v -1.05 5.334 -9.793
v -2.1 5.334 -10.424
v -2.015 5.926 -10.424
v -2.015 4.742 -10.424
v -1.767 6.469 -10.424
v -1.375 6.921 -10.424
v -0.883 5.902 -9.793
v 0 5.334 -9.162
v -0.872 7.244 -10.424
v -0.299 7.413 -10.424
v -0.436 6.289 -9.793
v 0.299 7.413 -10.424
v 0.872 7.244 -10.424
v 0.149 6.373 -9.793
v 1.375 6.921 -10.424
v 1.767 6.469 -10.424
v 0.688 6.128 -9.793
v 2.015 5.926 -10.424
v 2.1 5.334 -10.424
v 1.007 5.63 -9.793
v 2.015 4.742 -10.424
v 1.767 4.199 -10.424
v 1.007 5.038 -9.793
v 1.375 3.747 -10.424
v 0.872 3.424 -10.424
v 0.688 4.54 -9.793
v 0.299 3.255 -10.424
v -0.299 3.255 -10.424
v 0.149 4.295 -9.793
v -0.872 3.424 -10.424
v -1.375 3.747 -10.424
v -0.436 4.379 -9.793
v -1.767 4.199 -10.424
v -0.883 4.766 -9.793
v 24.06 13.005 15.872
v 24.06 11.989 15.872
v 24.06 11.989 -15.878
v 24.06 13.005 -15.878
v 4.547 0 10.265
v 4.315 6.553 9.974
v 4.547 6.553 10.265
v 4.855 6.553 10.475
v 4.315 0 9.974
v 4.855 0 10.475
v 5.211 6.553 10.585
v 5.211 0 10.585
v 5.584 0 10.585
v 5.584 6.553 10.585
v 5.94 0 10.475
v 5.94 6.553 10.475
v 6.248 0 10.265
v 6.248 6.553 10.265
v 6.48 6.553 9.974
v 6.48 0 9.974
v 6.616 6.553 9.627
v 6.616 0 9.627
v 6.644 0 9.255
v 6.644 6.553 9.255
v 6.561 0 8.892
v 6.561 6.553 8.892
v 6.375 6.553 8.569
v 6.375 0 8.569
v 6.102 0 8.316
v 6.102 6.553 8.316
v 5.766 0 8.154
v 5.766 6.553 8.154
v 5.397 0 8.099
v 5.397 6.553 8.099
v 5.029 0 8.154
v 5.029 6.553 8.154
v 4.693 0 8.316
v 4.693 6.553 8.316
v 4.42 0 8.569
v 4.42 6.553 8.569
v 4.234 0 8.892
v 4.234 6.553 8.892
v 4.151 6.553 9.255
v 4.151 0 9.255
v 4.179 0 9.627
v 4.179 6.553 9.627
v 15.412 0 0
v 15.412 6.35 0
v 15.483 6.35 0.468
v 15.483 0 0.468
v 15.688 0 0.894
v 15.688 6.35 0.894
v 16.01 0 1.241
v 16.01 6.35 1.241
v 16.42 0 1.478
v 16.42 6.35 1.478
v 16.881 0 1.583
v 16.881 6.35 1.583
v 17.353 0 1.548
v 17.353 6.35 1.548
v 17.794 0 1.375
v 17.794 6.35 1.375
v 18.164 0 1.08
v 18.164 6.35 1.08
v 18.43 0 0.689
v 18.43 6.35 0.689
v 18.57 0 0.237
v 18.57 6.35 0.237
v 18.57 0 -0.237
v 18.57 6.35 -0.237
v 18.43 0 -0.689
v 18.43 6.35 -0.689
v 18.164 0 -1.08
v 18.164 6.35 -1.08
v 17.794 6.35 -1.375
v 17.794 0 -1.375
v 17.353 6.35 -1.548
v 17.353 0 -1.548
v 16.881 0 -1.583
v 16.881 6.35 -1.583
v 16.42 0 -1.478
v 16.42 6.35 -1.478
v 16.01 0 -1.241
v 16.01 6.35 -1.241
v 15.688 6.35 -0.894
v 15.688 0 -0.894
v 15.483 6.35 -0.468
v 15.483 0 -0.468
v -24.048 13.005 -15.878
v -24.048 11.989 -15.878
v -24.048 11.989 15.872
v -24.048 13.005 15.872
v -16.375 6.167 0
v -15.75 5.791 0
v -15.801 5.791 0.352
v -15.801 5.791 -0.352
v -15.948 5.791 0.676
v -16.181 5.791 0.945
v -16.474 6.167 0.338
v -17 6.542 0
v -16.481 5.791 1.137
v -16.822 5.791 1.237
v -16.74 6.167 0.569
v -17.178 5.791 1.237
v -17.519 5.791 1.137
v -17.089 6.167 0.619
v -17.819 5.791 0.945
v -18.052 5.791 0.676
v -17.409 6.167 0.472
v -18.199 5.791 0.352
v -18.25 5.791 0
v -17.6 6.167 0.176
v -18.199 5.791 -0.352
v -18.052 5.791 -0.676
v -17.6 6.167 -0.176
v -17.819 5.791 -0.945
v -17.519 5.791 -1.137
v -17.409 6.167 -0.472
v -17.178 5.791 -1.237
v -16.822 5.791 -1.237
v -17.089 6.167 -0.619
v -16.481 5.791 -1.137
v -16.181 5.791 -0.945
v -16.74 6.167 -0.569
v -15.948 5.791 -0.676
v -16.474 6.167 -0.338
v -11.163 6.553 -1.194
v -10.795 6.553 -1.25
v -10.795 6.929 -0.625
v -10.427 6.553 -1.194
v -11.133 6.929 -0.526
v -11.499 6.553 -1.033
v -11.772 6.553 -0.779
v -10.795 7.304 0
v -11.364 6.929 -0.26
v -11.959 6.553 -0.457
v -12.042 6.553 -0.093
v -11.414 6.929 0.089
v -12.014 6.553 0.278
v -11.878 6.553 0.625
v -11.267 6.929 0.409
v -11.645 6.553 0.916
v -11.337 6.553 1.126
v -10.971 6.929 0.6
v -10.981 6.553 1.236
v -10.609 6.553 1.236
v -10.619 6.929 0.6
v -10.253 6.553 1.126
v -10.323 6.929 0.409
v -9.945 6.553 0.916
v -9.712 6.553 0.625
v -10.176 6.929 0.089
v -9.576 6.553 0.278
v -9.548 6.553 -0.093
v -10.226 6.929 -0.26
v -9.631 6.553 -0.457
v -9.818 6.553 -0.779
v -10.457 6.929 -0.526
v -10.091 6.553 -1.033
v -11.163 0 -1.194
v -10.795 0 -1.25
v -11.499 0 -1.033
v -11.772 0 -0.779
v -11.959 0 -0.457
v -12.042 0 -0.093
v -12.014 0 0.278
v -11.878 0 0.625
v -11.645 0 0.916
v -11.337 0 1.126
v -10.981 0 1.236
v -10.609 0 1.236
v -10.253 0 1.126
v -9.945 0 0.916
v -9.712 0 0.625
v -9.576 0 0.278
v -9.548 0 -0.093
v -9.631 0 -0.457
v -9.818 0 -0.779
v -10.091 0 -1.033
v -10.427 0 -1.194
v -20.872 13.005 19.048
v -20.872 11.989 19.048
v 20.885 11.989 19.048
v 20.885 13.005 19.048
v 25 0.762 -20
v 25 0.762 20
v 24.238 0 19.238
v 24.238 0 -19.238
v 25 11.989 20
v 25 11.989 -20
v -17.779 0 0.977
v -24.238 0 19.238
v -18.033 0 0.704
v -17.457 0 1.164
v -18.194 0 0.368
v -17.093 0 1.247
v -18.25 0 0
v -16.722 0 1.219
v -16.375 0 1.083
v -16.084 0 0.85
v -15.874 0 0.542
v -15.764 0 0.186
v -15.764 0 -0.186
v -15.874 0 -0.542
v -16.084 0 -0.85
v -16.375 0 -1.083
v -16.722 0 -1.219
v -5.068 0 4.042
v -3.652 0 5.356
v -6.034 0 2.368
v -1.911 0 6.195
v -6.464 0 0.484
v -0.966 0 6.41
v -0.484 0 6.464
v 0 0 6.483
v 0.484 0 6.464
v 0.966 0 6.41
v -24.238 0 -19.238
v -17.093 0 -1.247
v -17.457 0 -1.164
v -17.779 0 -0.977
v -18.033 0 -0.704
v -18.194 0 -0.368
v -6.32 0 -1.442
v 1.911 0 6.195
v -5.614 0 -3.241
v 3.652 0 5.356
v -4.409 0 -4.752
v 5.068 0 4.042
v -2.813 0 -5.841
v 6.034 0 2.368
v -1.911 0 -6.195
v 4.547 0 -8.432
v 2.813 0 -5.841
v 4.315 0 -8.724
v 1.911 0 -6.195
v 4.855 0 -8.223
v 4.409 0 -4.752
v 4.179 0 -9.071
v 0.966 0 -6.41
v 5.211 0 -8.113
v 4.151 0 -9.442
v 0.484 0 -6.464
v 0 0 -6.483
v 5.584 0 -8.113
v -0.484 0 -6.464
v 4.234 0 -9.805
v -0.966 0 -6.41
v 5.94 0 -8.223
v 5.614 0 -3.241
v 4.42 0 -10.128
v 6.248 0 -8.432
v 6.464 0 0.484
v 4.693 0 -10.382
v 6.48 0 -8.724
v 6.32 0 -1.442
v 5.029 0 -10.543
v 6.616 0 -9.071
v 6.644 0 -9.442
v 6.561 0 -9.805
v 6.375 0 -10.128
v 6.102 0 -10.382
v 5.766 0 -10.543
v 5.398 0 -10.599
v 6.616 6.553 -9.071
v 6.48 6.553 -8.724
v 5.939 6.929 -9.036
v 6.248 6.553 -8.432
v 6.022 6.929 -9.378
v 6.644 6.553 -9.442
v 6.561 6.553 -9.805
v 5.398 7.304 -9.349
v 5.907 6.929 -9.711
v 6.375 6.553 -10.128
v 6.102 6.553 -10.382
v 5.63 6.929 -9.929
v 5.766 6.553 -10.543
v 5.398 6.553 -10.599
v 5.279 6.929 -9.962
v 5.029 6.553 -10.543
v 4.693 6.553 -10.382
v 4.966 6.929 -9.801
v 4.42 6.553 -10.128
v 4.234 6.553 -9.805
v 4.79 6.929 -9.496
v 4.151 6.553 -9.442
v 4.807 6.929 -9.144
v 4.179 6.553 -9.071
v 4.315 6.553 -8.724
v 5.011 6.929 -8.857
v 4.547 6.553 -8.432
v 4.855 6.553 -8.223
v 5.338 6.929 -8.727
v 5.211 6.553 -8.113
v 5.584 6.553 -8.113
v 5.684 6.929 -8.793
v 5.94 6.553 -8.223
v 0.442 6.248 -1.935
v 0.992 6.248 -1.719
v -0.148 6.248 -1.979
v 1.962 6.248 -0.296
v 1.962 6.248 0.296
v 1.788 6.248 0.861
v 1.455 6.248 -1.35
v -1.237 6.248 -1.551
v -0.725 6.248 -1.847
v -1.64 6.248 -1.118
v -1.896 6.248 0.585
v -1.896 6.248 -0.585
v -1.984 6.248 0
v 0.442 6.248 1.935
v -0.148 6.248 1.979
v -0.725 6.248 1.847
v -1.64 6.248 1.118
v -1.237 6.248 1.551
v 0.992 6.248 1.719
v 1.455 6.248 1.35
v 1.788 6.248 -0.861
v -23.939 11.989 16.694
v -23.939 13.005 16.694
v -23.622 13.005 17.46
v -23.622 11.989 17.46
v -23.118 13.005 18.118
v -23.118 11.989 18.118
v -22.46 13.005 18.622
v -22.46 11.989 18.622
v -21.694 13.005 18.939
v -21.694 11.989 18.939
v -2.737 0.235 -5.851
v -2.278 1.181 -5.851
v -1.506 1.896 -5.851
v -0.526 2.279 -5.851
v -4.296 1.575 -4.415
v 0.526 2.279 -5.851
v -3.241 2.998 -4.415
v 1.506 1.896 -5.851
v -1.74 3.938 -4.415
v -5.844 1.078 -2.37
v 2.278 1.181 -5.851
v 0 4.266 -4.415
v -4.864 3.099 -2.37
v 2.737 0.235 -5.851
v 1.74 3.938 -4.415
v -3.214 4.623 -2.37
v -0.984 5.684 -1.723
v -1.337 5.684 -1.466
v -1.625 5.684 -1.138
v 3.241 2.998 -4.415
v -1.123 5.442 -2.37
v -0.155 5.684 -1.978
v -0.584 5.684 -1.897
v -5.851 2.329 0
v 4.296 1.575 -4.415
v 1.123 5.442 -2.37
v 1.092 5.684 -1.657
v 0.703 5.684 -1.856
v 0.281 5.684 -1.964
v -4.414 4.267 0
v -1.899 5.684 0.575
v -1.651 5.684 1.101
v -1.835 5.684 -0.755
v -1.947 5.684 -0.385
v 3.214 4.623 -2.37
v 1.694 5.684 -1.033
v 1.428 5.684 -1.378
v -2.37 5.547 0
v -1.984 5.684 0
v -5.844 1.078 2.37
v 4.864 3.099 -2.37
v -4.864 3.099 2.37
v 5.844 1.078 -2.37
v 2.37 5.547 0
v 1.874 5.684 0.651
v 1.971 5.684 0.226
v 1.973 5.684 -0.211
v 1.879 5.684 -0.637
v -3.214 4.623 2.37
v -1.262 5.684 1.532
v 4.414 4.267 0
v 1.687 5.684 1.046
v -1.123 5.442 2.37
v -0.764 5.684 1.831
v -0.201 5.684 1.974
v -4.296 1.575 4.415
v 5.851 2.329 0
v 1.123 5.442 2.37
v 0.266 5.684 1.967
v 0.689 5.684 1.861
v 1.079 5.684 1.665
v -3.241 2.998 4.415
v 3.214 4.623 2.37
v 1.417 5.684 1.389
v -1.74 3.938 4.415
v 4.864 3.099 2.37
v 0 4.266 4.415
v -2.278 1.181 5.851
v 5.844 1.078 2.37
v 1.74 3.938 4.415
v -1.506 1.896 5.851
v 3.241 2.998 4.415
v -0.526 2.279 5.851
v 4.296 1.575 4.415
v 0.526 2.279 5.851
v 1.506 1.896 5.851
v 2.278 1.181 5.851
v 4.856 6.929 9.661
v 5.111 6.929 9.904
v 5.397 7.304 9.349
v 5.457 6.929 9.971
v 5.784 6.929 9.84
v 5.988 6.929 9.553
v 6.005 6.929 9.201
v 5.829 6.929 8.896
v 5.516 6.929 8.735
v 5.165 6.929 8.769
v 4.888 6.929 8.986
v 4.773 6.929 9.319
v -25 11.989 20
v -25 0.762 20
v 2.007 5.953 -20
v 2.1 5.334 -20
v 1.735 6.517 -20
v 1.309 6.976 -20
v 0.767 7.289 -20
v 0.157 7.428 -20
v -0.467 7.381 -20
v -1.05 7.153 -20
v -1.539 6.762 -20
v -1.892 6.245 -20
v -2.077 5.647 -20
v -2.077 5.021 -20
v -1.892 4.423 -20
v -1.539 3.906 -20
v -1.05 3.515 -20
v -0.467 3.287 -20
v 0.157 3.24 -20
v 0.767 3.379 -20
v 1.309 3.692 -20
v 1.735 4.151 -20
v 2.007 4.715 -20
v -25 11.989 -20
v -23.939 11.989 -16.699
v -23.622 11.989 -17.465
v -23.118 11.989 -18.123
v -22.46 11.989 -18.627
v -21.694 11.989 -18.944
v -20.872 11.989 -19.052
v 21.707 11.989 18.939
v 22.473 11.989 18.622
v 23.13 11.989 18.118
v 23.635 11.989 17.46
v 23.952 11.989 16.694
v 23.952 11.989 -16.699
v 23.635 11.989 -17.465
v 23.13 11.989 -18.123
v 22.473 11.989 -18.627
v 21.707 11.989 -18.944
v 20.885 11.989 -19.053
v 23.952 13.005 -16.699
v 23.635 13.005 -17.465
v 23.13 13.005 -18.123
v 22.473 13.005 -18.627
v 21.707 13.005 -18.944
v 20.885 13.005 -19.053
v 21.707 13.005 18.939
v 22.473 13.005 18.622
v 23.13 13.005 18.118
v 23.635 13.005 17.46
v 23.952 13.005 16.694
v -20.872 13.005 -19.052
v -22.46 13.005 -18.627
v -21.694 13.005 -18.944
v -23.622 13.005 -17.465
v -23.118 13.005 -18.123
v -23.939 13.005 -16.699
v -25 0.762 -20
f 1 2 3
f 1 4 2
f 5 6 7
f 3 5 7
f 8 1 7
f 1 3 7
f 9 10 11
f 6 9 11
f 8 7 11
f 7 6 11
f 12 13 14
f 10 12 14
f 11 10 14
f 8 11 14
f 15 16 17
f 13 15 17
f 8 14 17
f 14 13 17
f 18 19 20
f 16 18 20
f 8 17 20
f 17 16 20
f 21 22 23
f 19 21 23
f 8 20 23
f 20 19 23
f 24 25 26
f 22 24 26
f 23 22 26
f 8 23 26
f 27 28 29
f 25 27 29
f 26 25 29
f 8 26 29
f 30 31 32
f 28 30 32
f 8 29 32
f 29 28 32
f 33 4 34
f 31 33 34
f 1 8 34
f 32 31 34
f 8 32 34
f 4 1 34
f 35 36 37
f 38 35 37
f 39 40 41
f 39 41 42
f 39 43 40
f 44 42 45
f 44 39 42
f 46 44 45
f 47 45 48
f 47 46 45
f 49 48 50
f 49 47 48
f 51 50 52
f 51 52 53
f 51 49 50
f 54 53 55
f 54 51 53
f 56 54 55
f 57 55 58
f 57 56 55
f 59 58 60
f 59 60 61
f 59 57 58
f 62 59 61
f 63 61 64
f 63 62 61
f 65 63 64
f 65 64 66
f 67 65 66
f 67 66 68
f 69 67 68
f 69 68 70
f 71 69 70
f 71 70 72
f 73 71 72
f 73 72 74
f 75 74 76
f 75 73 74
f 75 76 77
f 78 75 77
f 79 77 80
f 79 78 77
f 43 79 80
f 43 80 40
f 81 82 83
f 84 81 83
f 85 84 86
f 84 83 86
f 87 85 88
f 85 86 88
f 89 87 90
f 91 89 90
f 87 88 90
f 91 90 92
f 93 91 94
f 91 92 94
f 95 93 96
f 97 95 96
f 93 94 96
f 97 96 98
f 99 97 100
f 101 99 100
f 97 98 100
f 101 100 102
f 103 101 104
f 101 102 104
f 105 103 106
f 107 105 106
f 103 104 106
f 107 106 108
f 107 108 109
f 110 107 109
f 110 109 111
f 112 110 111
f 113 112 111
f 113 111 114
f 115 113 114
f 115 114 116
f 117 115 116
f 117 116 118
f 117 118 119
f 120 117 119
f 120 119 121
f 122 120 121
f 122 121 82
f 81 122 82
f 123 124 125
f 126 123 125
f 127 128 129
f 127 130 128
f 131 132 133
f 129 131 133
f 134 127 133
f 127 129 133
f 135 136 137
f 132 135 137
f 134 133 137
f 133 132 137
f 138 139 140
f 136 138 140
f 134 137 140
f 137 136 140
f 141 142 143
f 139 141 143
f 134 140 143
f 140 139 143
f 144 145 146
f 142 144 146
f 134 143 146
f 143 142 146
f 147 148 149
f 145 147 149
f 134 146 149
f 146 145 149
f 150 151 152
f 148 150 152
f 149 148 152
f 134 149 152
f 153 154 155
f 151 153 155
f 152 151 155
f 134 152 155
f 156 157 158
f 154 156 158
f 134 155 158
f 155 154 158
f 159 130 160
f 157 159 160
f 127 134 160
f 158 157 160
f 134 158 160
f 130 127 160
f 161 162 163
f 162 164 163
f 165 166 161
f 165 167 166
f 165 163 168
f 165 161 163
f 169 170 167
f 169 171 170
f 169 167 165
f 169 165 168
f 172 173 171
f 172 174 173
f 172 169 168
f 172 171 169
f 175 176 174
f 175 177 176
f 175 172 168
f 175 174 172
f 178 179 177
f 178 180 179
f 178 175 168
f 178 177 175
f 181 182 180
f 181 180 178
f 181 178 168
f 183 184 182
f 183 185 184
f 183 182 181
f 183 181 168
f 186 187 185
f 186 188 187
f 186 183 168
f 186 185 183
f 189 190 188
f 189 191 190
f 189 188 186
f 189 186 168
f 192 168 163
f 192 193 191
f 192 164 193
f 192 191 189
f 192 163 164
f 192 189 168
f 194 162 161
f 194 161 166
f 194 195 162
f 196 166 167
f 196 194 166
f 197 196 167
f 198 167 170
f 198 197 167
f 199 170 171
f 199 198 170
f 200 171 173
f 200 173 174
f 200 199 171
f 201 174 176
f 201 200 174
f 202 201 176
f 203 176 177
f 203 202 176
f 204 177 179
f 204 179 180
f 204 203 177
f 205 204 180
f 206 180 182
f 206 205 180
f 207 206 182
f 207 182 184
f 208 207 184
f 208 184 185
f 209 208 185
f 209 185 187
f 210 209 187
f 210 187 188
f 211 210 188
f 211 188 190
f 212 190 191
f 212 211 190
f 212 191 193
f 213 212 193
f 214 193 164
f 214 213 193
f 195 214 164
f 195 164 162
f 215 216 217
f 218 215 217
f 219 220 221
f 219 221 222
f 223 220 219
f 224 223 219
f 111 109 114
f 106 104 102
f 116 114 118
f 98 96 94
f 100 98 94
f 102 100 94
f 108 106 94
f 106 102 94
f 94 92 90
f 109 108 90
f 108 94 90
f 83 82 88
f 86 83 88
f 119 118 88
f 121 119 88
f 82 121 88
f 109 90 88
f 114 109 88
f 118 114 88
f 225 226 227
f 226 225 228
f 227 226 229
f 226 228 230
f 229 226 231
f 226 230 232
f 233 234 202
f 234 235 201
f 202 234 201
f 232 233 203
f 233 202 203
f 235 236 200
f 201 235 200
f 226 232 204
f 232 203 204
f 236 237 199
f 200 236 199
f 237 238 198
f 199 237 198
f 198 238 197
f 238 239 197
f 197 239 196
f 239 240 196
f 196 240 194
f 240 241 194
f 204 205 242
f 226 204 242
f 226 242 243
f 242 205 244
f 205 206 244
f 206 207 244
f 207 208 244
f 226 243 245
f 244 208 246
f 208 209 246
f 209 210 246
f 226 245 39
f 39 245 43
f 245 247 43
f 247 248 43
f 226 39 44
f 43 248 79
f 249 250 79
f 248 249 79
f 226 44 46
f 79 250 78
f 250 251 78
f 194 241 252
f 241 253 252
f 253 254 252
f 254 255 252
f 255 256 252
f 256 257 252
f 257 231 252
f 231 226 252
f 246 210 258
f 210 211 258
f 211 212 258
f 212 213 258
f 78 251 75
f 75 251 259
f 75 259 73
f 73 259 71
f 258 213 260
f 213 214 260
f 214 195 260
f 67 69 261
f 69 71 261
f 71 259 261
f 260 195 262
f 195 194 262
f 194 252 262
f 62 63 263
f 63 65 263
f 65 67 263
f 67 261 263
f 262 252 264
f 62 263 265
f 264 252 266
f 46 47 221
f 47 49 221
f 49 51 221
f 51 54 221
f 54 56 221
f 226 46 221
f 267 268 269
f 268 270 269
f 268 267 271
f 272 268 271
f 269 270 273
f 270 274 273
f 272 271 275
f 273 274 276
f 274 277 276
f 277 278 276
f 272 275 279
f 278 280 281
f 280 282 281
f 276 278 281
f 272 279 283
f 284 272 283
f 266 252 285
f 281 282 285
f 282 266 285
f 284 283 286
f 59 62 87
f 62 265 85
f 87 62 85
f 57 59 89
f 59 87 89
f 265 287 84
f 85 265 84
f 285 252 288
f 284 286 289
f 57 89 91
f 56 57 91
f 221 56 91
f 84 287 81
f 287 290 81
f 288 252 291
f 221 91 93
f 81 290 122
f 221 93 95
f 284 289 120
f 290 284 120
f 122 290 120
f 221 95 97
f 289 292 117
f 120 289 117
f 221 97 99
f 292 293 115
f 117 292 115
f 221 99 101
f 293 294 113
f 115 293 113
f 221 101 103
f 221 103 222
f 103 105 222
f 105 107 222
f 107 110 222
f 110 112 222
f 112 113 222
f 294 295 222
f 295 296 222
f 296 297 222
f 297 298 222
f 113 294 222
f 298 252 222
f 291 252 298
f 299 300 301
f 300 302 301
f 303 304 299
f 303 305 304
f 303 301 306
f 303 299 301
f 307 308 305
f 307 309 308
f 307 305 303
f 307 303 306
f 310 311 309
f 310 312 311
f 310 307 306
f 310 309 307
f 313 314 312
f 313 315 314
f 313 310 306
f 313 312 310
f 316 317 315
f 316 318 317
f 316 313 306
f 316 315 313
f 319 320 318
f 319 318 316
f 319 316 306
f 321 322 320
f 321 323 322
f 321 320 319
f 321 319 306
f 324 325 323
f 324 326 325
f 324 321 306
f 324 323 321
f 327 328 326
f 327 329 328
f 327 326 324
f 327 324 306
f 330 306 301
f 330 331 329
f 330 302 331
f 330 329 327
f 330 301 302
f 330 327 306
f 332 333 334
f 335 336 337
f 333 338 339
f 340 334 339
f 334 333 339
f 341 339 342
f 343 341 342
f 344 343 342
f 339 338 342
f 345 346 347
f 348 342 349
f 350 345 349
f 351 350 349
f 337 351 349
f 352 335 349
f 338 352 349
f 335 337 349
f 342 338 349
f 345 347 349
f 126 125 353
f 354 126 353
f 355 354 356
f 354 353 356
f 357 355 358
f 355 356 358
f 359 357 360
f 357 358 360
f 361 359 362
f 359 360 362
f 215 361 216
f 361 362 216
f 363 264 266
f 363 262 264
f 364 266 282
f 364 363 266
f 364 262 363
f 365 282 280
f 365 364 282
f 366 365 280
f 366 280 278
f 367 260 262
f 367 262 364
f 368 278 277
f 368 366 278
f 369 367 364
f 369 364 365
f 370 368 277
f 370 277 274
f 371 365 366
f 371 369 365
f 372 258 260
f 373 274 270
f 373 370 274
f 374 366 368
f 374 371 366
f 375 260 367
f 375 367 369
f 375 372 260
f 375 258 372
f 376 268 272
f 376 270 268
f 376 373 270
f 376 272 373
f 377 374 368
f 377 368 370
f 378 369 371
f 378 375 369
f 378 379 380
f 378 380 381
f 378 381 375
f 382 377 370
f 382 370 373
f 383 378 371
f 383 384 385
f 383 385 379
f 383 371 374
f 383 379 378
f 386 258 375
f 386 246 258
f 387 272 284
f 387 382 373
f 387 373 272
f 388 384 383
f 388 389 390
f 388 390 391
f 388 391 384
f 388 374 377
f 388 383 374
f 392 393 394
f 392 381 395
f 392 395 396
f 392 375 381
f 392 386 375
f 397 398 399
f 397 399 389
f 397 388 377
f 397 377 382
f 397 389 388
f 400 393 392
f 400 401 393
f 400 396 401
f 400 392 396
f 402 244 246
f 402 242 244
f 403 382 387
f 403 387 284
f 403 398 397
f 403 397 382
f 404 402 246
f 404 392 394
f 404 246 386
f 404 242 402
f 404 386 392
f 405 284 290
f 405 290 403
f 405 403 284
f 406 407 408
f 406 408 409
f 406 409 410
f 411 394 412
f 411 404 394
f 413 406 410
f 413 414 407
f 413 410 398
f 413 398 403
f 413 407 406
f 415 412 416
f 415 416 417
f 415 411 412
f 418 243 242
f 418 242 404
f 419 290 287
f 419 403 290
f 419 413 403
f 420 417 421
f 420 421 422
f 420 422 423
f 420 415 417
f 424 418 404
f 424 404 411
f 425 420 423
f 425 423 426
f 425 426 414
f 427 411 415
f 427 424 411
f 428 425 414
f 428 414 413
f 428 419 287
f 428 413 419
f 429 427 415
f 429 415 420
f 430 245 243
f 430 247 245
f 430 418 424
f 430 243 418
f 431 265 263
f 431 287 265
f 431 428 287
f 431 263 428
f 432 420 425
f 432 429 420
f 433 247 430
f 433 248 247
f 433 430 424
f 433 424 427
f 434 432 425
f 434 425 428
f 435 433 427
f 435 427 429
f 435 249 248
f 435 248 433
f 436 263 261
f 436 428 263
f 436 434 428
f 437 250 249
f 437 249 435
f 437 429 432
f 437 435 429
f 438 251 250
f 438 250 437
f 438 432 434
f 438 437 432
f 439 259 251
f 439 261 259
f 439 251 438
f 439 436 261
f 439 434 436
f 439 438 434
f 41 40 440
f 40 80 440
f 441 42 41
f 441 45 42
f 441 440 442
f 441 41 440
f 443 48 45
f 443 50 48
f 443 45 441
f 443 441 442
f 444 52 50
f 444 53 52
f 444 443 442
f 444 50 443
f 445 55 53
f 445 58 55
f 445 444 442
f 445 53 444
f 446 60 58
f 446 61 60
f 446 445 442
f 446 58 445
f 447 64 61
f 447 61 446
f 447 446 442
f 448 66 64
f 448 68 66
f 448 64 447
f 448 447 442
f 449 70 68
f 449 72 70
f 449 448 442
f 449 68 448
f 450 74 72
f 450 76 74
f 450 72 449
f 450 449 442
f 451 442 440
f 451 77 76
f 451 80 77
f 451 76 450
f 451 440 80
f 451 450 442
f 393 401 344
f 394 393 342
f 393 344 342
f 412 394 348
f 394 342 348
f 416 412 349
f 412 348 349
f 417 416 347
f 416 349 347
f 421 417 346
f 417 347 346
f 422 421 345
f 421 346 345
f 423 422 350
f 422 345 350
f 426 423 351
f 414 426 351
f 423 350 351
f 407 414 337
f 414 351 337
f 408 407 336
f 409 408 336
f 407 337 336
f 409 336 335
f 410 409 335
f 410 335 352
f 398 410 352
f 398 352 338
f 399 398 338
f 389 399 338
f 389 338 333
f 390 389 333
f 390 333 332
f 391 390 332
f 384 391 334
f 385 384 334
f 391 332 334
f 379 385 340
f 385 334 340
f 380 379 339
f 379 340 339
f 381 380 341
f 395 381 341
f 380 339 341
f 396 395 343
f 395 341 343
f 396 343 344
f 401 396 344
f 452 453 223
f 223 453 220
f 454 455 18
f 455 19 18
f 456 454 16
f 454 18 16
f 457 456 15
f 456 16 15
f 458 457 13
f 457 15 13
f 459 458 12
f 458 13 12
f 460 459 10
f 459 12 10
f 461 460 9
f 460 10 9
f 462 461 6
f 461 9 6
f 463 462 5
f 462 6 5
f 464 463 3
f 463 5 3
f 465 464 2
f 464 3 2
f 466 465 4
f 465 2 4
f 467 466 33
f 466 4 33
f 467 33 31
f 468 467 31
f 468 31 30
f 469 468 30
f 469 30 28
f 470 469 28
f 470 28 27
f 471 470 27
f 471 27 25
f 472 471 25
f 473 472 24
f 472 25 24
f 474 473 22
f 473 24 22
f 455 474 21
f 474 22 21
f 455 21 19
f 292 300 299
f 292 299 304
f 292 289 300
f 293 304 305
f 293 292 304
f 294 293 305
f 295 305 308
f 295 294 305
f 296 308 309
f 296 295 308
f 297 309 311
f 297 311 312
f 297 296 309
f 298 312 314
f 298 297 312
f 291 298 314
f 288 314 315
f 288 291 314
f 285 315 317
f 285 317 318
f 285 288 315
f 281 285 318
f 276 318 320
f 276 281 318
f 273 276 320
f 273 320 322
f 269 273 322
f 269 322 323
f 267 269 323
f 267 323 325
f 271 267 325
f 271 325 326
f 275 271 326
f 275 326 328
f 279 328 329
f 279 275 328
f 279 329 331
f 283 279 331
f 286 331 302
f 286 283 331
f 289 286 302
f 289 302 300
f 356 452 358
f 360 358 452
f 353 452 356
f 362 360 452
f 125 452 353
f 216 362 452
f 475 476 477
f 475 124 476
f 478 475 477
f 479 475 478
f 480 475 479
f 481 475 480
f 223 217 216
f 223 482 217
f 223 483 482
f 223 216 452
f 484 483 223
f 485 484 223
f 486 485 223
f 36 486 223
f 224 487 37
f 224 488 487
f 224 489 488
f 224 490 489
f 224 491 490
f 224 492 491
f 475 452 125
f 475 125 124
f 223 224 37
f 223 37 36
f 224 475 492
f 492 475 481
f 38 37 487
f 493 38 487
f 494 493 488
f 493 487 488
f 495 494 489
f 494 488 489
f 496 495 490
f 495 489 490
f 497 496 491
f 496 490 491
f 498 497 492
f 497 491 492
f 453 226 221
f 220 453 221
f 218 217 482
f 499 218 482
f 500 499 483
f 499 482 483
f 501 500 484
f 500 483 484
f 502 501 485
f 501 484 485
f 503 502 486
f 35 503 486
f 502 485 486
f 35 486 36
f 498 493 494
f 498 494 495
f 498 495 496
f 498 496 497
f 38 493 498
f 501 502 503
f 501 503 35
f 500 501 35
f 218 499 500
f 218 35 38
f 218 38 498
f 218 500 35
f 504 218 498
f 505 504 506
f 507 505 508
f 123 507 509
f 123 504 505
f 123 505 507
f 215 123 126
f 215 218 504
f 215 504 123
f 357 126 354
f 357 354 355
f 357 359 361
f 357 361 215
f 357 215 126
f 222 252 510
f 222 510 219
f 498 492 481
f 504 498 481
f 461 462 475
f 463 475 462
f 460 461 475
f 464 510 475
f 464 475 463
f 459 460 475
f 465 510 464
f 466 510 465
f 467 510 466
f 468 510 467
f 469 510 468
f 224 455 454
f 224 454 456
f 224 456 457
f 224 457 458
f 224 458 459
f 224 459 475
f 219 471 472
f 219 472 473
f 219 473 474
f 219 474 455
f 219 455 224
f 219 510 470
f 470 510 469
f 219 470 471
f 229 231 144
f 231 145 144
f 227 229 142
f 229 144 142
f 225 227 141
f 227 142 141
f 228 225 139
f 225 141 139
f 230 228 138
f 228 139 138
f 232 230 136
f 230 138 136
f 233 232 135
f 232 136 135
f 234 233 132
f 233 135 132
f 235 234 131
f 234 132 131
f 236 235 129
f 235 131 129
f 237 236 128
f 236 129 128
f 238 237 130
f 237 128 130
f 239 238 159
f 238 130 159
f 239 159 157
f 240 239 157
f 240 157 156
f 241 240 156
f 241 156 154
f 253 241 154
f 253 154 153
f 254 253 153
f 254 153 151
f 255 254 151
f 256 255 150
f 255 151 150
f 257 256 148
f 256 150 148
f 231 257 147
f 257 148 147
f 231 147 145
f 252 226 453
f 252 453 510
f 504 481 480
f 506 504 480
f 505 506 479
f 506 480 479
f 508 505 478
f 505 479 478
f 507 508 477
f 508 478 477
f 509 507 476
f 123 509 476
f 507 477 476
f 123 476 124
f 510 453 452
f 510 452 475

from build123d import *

# Parameters (mm, degrees)
SKETCH1_W                           = 50
SKETCH1_H                           = 40
EXTRUDE1_DEPTH                      = 11.9888
M5X0_8_TAPPED_HOLE1_D               = 4.2
M5X0_8_TAPPED_HOLE1_DEPTH           = 9.5758
M5X0_8_TAPPED_HOLE1_TIP             = 1.2618073
F_1_8_0_125_DIAMETER_HOLE1_D        = 3.175
F_1_8_0_125_DIAMETER_HOLE1_DEPTH    = 6.35
CIRPATTERN1_COUNT                   = 3
F_5_32_0_15625_DIAMETER_HOLE1_D     = 3.96875
F_5_32_0_15625_DIAMETER_HOLE1_DEPTH = 6.2484
M3X0_5_TAPPED_HOLE2_D               = 2.5
M3X0_5_TAPPED_HOLE2_DEPTH           = 5.7912
M3X0_5_TAPPED_HOLE2_TIP             = 0.751075774
CHAMFER1_SIZE                       = 0.762
EXTRUDE2_DEPTH                      = 1.016


with BuildPart() as part:
    # Sketch1 → Extrude1 (new body)
    with BuildSketch(Plane(origin=(0, 0, 0), x_dir=(1, 0, 0), z_dir=(0, 1, 0))):
        Rectangle(SKETCH1_W, SKETCH1_H)
    extrude(amount=EXTRUDE1_DEPTH)

    # M5x0.8 Tapped Hole1
    with Locations(Plane(origin=(0, 0, -20), x_dir=(-1, 0, 0), z_dir=(0, 0, -1))):
        with Locations((0, 5.334)):
            Hole(M5X0_8_TAPPED_HOLE1_D / 2, depth=M5X0_8_TAPPED_HOLE1_DEPTH)
            with Locations((0, 0, -(M5X0_8_TAPPED_HOLE1_DEPTH + M5X0_8_TAPPED_HOLE1_TIP / 2))):  # 118° drill point
                Cone(0, M5X0_8_TAPPED_HOLE1_D / 2, M5X0_8_TAPPED_HOLE1_TIP, mode=Mode.SUBTRACT)

    # 1_8 _0.125_ Diameter Hole1
    with Locations(Plane.XZ):
        with Locations((17, 0)):
            Hole(F_1_8_0_125_DIAMETER_HOLE1_D / 2, depth=F_1_8_0_125_DIAMETER_HOLE1_DEPTH)

    # Sketch8 → M3x0.5 Tapped Hole1 (revolve, cut)
    with BuildSketch(Plane(origin=(-10.795, 0, 0), x_dir=(0, 0, -1), z_dir=(1, 0, 0))):
        Polygon((0, 0), (0, 7.304275774), (1.25, 6.5532), (1.25, 0), align=None)
    m3x0_5_tapped_hole1 = revolve(axis=Axis((-10.795, -6.35, 0), (0, 1, 0)), mode=Mode.SUBTRACT)

    # CirPattern1: M3x0.5 Tapped Hole1 ×3 about axis
    cirpattern1_axis = Axis((0, 0, 0), (0, 1, 0))
    for i in range(1, CIRPATTERN1_COUNT):
        add(m3x0_5_tapped_hole1.rotate(cirpattern1_axis, i * 360 / CIRPATTERN1_COUNT), mode=Mode.SUBTRACT)

    # 5_32 _0.15625_ Diameter Hole1
    with Locations(Plane.XZ):
        with Locations((0, 0)):
            Hole(F_5_32_0_15625_DIAMETER_HOLE1_D / 2, depth=F_5_32_0_15625_DIAMETER_HOLE1_DEPTH)

    # Sketch12 → Cut-Revolve1 (revolve, cut)
    with BuildSketch(Plane.XZ.offset(0.508)):
        with BuildLine():
            Line((0, 6.5024), (0, -6.5024))
            ThreePointArc((0, -6.5024), (6.5024, 0), (0, 6.5024))
        make_face()
    revolve(axis=Axis((0, -0.508, 6.5024), (0, 0, -1)), mode=Mode.SUBTRACT)

    # M3x0.5 Tapped Hole2
    with Locations(Plane.XZ):
        with Locations((-17, 0)):
            Hole(M3X0_5_TAPPED_HOLE2_D / 2, depth=M3X0_5_TAPPED_HOLE2_DEPTH)
            with Locations((0, 0, -(M3X0_5_TAPPED_HOLE2_DEPTH + M3X0_5_TAPPED_HOLE2_TIP / 2))):  # 118° drill point
                Cone(0, M3X0_5_TAPPED_HOLE2_D / 2, M3X0_5_TAPPED_HOLE2_TIP, mode=Mode.SUBTRACT)

    # Chamfer1
    chamfer1_edges = [part.edges().sort_by_distance(p)[0] for p in [
        (0, 0, -20),
        (25, 0, 0),
        (0, 0, 20),
        (-25, 0, 0),
    ]]
    chamfer(chamfer1_edges, length=CHAMFER1_SIZE)

    # Sketch2 → Extrude2 (add)
    with BuildSketch(Plane(origin=(0, 11.9888, 0), x_dir=(-1, 0, 0), z_dir=(0, 1, 0))):
        with BuildLine():
            Line((20.8725, 19.0475), (-20.8851, 19.0475))
            ThreePointArc((-20.8851, 19.0475), (-23.13016403, 18.11756403), (-24.0601, 15.8725))
            Line((-24.0601, 15.8725), (-24.0601, -15.8775))
            ThreePointArc((-24.0601, -15.8775), (-23.13016403, -18.12256403), (-20.8851, -19.0525))
            Line((-20.8851, -19.0525), (20.8725, -19.0525))
            ThreePointArc((20.8725, -19.0525), (23.11756403, -18.12256403), (24.0475, -15.8775))
            Line((24.0475, -15.8775), (24.0475, 15.8725))
            ThreePointArc((24.0475, 15.8725), (23.11756403, 18.11756403), (20.8725, 19.0475))
        make_face()
    extrude(amount=EXTRUDE2_DEPTH)


solid = part.part
